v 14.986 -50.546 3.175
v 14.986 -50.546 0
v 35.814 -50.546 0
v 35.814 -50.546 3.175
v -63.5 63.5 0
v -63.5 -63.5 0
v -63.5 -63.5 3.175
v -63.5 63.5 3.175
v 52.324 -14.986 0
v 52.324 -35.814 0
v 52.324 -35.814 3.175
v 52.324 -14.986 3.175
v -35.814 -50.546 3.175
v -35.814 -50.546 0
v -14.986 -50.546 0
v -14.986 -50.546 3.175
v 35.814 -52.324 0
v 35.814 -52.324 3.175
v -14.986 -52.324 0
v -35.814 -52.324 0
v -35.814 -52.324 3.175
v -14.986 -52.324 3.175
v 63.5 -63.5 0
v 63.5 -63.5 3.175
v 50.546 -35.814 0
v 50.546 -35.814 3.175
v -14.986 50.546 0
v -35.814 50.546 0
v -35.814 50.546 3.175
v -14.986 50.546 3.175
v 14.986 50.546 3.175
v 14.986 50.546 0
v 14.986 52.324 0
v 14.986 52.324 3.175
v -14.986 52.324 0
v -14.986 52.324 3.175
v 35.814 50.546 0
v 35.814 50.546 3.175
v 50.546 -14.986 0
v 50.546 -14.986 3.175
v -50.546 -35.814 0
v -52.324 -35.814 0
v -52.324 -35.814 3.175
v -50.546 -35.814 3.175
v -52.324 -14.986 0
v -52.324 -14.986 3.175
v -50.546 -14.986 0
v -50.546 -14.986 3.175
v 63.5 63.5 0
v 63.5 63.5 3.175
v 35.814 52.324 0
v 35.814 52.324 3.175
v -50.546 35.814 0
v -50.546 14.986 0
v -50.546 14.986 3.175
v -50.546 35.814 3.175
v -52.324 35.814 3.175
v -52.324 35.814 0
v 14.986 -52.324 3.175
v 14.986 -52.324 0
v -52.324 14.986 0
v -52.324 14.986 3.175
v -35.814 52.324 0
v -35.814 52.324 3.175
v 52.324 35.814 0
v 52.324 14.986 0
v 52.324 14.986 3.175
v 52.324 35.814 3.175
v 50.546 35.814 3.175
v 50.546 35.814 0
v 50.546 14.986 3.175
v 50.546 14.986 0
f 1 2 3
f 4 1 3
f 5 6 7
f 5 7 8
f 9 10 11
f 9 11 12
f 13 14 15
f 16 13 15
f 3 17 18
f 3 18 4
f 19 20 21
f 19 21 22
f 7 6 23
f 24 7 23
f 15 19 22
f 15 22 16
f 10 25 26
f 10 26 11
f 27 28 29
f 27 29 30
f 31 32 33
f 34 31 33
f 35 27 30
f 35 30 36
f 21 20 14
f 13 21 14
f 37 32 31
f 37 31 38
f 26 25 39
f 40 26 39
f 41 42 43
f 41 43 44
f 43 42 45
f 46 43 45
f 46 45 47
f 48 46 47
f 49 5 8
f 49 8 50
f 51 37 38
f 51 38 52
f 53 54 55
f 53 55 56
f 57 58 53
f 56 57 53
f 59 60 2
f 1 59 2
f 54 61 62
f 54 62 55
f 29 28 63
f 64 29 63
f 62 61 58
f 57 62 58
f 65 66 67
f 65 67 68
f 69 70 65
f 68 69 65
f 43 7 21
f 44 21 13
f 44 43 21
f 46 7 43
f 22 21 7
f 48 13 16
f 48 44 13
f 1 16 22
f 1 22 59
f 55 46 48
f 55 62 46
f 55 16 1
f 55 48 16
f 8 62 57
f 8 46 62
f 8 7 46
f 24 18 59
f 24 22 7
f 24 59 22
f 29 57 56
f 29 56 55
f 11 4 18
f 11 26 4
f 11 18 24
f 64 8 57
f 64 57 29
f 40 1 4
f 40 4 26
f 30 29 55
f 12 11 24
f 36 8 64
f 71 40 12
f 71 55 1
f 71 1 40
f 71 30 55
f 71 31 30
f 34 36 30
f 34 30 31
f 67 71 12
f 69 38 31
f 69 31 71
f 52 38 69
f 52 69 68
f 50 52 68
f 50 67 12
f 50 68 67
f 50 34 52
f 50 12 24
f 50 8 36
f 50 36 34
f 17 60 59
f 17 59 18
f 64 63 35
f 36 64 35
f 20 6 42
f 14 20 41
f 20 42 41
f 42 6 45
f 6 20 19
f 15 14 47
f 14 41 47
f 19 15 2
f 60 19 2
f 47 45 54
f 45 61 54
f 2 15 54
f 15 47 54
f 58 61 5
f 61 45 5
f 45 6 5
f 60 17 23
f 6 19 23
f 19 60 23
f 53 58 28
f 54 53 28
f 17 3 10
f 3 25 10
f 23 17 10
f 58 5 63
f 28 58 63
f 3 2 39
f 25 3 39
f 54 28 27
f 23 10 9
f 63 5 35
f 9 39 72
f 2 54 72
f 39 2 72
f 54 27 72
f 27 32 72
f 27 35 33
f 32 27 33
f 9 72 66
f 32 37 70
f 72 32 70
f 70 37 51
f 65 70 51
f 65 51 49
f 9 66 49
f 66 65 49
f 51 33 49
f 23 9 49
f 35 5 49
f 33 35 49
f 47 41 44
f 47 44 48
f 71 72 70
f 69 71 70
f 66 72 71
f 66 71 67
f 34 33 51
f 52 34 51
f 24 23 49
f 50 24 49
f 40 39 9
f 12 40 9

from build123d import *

# Parameters (mm, degrees)
F0_W     = 127
F0_H     = 127
F0_W_2   = 20.828
F0_H_2   = 1.778
F0_W_3   = 1.778
F0_H_3   = 20.828
F1_DEPTH = 3.175


with BuildPart() as f1:
    # F0 (on Top) → F1 (new body)
    with BuildSketch(Plane.XY):
        Rectangle(F0_W, F0_H)
        with Locations((-25.4, -51.435)):
            Rectangle(F0_W_2, F0_H_2, mode=Mode.SUBTRACT)
        with Locations((-51.435, -25.4)):
            Rectangle(F0_W_3, F0_H_3, mode=Mode.SUBTRACT)
        with Locations((25.4, -51.435)):
            Rectangle(F0_W_2, F0_H_2, mode=Mode.SUBTRACT)
        with Locations((51.435, -25.4)):
            Rectangle(F0_W_3, F0_H_3, mode=Mode.SUBTRACT)
        with Locations((-51.435, 25.4)):
            Rectangle(F0_W_3, F0_H_3, mode=Mode.SUBTRACT)
        with Locations((-25.4, 51.435)):
            Rectangle(F0_W_2, F0_H_2, mode=Mode.SUBTRACT)
        with Locations((51.435, 25.4)):
            Rectangle(F0_W_3, F0_H_3, mode=Mode.SUBTRACT)
        with Locations((25.4, 51.435)):
            Rectangle(F0_W_2, F0_H_2, mode=Mode.SUBTRACT)
    extrude(amount=F1_DEPTH)


solid = f1.part
